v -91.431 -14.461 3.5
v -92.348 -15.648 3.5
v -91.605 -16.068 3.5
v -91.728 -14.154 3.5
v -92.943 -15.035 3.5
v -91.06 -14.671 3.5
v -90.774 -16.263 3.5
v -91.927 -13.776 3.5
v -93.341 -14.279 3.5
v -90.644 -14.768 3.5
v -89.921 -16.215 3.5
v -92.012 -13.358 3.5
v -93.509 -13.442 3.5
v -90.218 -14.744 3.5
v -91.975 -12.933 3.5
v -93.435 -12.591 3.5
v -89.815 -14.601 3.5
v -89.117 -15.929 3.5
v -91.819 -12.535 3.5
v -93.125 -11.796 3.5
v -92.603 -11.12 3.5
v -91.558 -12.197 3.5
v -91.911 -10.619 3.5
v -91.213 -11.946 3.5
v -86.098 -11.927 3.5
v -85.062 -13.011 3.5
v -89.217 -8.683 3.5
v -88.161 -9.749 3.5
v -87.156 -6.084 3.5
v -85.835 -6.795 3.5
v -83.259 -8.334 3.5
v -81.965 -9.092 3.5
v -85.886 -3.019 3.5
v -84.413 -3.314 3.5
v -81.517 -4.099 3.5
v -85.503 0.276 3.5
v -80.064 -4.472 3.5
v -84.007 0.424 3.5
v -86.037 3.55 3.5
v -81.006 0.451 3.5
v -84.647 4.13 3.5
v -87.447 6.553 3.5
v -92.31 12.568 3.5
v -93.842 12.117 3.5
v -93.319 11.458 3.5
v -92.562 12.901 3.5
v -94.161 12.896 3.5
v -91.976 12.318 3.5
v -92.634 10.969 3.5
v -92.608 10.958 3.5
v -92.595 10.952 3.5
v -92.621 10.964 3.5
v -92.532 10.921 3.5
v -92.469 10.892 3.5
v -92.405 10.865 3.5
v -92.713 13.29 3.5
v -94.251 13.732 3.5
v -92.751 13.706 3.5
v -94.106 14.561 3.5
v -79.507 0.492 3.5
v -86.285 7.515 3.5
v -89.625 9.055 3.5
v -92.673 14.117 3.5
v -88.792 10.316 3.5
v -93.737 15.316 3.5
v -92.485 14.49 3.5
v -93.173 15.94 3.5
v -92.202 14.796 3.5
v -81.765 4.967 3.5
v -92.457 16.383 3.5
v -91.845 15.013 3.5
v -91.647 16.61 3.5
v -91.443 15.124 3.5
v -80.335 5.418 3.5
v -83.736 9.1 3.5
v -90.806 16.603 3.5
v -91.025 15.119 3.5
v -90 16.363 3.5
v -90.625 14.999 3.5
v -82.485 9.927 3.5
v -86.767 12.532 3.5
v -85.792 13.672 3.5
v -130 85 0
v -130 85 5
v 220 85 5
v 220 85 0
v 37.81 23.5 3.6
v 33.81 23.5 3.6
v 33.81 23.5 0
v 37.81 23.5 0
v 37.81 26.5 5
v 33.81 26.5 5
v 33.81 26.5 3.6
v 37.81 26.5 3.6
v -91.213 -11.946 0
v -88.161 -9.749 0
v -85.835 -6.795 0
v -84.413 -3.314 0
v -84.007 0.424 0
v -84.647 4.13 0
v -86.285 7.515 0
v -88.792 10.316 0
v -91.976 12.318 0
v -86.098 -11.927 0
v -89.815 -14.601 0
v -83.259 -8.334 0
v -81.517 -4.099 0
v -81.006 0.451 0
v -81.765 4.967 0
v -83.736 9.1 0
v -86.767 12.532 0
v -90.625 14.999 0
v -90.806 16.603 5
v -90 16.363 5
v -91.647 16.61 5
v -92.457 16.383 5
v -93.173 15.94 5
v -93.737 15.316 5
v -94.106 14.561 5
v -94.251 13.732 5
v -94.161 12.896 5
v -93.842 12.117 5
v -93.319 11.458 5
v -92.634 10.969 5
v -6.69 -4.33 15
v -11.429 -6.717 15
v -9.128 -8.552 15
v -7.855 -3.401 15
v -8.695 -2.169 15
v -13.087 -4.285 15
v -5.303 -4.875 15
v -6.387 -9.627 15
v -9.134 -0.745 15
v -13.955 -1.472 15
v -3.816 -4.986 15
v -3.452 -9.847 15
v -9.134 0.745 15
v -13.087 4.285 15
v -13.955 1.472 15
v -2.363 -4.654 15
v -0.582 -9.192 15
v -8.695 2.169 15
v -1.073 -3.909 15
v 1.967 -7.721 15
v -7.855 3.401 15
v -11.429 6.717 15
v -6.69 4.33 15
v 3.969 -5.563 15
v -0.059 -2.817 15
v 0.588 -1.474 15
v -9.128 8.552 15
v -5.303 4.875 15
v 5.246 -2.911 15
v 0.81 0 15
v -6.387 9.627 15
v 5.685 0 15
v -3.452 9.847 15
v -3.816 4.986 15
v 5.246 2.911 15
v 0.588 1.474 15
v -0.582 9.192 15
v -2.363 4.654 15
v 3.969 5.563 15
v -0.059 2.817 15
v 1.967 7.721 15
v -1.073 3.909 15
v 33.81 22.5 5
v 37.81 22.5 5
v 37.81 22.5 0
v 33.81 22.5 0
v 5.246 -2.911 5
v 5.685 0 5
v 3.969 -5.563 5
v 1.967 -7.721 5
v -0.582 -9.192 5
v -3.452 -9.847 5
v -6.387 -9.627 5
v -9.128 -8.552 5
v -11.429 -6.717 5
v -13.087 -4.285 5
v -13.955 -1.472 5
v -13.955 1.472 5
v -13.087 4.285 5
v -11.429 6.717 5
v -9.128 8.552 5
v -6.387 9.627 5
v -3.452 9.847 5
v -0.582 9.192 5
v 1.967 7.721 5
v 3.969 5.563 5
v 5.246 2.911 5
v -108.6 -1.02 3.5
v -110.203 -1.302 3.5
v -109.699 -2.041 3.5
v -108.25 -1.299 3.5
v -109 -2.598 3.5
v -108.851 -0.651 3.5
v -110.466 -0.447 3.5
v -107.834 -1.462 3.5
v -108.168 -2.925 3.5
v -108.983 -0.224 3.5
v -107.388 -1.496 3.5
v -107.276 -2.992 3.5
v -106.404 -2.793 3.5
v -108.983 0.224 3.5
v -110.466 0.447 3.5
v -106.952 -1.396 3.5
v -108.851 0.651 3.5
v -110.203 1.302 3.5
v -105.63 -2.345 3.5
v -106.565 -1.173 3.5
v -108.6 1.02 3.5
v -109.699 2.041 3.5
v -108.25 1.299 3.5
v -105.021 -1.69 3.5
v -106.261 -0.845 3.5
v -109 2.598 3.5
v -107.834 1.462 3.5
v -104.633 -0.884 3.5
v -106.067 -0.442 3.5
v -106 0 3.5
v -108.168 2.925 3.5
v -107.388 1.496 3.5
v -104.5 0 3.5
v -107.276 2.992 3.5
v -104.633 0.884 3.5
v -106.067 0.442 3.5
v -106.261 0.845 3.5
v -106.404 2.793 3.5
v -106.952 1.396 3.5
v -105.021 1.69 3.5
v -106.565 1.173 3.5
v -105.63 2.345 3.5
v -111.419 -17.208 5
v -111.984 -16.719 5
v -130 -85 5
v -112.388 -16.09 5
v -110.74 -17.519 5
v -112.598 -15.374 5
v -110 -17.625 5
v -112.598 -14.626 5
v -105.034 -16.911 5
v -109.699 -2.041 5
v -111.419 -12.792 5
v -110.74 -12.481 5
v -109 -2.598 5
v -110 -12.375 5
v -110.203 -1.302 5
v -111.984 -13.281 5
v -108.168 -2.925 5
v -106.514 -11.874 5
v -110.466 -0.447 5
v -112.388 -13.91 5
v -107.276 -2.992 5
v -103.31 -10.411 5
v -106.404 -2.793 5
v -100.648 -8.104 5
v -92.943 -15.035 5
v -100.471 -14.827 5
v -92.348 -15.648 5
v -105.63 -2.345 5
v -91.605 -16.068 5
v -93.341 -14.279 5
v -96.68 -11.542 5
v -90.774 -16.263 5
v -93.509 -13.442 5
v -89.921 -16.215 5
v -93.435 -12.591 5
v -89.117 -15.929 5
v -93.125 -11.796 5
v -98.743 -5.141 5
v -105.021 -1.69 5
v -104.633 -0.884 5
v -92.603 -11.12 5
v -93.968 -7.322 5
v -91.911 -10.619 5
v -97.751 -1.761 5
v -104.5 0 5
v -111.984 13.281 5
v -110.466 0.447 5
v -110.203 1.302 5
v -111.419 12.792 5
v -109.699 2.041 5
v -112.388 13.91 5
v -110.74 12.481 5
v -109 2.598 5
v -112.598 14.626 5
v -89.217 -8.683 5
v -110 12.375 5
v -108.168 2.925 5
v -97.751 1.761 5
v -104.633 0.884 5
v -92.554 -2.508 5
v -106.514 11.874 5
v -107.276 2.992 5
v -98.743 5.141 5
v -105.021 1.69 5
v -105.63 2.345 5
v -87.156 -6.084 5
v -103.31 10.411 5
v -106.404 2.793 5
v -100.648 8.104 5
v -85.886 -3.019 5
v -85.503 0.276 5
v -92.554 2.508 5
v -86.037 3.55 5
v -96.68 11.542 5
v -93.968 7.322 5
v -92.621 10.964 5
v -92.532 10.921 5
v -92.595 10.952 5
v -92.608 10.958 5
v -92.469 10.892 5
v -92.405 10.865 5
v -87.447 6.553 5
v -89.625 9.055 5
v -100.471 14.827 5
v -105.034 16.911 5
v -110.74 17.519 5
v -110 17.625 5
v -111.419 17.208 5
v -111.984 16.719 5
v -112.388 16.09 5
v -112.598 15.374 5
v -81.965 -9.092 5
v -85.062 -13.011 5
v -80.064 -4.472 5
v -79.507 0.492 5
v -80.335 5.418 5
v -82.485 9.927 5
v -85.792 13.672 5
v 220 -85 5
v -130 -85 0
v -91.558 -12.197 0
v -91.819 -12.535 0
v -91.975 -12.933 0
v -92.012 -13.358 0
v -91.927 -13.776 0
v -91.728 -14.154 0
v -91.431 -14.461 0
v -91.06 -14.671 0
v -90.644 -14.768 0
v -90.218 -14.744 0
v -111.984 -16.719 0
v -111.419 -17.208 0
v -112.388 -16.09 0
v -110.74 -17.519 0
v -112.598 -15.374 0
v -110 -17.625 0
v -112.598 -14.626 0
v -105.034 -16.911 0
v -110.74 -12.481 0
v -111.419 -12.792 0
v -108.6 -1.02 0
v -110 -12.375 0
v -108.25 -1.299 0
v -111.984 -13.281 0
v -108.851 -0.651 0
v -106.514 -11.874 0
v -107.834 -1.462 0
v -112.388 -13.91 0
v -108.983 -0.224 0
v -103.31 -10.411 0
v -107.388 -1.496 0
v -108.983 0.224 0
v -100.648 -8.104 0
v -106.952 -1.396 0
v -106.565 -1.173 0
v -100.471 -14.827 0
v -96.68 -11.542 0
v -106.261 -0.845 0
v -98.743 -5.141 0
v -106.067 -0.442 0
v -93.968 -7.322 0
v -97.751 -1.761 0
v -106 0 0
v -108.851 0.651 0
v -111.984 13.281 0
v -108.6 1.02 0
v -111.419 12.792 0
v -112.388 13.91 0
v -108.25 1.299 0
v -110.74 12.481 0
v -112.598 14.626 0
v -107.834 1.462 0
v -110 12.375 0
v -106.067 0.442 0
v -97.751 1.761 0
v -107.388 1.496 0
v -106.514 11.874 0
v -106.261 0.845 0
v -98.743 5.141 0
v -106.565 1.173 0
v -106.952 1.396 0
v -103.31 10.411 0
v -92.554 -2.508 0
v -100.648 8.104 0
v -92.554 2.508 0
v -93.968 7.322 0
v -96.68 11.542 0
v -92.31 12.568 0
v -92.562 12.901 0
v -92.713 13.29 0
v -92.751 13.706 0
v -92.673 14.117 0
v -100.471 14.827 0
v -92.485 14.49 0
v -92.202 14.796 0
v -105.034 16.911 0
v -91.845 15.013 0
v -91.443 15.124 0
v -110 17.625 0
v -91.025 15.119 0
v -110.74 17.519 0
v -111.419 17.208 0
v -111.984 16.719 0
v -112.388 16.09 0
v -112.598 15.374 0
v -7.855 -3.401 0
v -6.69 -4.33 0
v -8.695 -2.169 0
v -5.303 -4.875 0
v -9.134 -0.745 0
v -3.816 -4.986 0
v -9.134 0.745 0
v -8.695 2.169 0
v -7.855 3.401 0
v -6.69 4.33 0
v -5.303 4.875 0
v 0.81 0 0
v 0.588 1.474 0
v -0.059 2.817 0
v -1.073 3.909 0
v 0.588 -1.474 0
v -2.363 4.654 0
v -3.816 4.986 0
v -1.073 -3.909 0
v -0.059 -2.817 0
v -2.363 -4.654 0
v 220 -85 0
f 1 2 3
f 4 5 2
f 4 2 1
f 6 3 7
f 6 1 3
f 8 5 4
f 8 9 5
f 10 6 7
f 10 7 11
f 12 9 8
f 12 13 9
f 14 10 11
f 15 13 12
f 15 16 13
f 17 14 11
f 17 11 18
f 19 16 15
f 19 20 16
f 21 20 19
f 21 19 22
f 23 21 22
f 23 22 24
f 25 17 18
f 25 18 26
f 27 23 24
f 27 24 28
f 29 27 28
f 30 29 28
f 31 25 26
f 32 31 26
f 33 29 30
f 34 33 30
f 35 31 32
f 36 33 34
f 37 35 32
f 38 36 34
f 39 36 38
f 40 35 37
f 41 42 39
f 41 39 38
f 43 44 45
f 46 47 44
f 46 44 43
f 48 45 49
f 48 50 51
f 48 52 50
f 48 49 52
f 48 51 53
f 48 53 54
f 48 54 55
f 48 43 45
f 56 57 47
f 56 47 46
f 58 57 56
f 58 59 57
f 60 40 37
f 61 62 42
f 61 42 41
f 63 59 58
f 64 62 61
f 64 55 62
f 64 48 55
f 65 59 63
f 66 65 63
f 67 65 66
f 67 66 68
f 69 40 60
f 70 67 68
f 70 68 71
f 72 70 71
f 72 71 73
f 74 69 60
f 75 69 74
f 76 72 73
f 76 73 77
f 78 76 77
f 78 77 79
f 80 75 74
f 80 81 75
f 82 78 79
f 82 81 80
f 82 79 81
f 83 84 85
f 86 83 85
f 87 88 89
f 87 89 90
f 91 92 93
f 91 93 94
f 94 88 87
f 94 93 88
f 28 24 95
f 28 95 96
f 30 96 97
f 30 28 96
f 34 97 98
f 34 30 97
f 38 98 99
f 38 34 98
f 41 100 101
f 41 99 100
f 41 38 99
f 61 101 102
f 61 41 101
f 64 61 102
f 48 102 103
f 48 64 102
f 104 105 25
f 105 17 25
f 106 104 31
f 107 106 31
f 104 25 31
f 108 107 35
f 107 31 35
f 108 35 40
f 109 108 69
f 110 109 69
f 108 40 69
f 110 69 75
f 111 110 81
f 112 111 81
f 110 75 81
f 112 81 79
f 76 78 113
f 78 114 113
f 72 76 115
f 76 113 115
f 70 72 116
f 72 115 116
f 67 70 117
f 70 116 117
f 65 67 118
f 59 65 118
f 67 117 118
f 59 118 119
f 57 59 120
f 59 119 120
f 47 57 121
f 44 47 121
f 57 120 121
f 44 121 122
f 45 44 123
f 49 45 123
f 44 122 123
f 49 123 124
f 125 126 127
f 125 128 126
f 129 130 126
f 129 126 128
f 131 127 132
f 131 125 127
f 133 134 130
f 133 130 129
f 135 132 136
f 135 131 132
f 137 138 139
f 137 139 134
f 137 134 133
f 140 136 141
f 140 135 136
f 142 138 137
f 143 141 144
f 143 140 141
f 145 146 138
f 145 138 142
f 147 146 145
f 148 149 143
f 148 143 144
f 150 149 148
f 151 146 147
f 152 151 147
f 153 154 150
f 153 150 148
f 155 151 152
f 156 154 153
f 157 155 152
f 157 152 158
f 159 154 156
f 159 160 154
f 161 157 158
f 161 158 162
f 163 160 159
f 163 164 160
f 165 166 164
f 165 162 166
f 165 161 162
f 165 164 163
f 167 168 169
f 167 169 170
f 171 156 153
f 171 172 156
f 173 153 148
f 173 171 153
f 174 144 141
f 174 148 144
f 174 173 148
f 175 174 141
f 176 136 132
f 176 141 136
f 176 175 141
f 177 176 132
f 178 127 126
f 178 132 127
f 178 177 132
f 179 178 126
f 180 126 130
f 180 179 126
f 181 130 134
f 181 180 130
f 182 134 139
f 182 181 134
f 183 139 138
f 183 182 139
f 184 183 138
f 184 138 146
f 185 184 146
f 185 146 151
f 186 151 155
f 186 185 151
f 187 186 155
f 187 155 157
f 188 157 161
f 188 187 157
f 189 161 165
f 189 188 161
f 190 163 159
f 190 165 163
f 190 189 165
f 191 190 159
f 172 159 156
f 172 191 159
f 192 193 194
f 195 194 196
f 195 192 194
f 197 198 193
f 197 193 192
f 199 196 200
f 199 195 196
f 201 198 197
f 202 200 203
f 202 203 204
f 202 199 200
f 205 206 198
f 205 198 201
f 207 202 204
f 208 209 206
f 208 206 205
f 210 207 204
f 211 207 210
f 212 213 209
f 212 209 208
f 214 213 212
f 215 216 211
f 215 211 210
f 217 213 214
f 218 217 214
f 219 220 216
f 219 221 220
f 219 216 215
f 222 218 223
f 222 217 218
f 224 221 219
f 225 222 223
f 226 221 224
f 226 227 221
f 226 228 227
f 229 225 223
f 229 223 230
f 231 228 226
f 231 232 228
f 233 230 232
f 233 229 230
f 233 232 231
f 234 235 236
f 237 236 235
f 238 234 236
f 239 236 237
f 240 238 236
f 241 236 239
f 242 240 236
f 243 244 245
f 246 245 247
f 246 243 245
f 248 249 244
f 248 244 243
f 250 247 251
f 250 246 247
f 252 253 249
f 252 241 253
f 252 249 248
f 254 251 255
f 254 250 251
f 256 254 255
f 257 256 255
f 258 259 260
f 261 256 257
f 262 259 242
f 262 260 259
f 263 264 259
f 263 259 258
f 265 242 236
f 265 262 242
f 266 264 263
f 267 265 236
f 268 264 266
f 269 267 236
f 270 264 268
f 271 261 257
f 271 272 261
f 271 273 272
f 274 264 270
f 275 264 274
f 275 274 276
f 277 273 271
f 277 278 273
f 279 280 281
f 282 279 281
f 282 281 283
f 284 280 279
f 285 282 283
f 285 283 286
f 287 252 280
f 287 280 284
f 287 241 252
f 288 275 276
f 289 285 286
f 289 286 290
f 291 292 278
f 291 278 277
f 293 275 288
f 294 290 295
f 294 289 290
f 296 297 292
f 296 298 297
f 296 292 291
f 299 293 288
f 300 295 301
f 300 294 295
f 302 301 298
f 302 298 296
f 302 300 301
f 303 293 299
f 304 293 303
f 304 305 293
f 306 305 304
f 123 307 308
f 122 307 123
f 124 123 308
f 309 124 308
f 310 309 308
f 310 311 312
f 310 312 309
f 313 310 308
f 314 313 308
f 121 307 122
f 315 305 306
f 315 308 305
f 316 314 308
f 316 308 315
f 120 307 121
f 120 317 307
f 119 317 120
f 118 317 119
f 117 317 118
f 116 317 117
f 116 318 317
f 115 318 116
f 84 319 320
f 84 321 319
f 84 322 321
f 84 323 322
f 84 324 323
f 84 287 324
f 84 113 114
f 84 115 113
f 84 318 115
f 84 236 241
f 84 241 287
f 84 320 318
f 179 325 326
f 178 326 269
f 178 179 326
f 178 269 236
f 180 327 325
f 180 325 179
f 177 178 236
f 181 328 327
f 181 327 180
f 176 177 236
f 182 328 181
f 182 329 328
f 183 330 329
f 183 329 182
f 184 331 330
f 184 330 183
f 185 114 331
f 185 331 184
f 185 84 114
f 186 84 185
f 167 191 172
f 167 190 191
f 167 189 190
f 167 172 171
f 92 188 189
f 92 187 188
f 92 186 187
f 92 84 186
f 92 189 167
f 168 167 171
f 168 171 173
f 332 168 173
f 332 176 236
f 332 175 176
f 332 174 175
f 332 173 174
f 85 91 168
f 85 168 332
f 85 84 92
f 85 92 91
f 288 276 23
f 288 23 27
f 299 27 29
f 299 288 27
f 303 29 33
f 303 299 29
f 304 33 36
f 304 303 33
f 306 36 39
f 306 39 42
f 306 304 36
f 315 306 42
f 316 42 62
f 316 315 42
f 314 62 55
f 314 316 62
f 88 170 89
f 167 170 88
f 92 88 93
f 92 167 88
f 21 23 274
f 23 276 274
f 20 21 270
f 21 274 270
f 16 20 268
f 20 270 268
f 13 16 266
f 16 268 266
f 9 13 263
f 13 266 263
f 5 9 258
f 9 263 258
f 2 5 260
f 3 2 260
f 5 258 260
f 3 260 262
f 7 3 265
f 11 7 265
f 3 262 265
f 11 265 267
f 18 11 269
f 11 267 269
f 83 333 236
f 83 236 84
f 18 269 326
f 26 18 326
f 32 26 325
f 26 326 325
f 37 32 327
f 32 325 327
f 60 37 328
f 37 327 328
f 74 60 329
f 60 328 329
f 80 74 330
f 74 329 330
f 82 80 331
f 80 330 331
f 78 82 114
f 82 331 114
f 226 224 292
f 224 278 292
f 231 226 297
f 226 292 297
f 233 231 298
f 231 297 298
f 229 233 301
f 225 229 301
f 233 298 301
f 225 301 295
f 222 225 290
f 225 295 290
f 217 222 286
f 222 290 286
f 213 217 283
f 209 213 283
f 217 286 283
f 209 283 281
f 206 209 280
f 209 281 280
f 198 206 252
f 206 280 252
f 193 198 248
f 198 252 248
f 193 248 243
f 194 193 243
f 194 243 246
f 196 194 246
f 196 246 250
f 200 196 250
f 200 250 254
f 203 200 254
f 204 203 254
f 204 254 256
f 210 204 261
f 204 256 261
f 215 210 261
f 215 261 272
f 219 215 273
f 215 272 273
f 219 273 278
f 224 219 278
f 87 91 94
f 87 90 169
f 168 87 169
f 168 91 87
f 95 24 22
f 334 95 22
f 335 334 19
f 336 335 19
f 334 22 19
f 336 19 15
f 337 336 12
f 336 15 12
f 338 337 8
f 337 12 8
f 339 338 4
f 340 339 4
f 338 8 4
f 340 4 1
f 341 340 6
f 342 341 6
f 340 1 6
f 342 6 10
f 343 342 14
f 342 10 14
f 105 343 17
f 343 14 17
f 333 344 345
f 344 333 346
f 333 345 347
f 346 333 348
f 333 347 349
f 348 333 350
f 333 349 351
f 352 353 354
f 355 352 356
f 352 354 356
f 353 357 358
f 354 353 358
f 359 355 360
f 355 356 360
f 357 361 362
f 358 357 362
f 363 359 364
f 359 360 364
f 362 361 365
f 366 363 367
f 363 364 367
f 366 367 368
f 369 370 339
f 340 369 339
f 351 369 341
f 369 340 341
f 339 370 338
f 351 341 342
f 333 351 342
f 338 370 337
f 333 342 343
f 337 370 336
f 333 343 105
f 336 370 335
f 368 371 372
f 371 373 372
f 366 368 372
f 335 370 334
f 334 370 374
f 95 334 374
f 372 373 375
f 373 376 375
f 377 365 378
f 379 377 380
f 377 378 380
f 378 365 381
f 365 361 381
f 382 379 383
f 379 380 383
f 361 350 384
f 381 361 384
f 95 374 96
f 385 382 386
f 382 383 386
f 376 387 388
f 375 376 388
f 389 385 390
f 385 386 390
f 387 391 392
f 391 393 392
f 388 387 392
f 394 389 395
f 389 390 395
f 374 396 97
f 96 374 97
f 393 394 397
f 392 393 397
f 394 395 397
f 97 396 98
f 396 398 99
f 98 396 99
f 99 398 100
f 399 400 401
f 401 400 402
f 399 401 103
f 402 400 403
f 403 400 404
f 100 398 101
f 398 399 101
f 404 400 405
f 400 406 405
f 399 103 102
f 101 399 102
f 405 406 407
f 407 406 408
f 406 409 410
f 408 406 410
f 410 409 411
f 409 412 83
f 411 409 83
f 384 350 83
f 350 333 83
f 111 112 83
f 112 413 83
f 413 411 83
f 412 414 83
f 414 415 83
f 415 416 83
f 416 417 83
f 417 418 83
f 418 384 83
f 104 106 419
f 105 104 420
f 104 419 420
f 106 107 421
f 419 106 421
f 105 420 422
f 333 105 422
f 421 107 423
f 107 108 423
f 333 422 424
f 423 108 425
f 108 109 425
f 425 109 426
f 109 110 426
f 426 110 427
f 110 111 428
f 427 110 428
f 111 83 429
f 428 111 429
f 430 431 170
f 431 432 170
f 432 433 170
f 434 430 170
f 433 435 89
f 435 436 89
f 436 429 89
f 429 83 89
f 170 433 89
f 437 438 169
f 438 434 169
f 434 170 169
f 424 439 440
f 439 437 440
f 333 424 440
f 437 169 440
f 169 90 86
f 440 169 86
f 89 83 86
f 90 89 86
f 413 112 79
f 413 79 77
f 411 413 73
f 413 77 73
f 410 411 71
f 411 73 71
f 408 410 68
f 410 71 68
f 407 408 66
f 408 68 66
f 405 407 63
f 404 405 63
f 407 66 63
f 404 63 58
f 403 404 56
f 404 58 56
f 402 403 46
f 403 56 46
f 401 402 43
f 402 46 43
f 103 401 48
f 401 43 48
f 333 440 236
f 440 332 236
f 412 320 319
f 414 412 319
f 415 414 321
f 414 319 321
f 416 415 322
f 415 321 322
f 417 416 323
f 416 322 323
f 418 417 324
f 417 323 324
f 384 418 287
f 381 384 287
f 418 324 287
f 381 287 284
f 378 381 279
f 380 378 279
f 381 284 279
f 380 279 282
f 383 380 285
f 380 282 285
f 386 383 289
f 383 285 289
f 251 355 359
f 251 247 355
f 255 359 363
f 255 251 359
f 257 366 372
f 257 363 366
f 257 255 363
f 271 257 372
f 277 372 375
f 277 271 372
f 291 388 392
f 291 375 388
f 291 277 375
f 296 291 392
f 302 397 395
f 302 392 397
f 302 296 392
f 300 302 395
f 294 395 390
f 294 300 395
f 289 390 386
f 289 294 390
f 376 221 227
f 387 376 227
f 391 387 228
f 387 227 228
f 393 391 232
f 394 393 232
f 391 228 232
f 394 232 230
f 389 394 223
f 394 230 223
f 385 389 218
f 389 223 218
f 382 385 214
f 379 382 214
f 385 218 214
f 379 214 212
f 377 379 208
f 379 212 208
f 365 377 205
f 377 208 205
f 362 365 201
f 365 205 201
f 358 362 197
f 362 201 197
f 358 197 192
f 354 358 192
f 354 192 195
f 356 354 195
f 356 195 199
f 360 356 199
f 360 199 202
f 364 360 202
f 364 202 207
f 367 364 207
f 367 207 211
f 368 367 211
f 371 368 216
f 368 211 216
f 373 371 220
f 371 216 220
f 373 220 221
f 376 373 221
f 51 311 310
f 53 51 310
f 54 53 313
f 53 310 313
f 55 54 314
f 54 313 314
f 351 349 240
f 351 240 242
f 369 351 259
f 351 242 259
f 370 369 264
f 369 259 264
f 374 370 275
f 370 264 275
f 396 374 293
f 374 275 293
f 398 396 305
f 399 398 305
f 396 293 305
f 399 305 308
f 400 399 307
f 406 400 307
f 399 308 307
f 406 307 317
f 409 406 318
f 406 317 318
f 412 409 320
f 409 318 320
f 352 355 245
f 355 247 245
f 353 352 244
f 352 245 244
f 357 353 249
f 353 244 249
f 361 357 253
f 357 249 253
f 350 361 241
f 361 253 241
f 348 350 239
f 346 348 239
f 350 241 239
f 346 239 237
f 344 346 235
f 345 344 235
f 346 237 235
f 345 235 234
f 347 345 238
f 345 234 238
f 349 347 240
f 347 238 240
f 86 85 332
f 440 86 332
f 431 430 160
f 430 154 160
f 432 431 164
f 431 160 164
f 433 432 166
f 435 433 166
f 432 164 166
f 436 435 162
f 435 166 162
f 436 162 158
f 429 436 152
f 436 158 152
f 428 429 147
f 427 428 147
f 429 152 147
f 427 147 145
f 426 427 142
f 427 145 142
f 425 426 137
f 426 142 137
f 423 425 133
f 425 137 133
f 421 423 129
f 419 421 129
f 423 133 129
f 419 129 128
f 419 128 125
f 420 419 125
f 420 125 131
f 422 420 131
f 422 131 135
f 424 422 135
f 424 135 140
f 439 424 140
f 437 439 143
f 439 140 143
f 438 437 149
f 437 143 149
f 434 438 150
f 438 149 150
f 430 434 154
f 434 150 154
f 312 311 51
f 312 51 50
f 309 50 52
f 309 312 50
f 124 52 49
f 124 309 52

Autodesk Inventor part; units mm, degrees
ref_plane "YZ Plane" through (0, 0, 0) normal (1, 0, 0) x (0, 1, 0)
ref_plane "XZ Plane" through (0, 0, 0) normal (0, 1, 0) x (-1, 0, 0)
sketch "Boceto2" plane through (0, 0, 0) normal (0, 0, 1) x (1, 0, 0)
  line L0 (130, -85) -> (-130, -85)
  line L1 (-130, -85) -> (-130, 85)
  line L2 (-130, 85) -> (130, 85)
  line L3 (130, 85) -> (130, -85)
  line L4 (130, -85) -> (-130, 85) construction
  line L5 (-130, -85) -> (130, 85) construction
  point P0 (0, 0)
  dimension "d0" = 260
  dimension "d1" = 170
extrude "Extrusión1" add sketch "Boceto2" along normal blind 5
sketch "Boceto3" plane through (0, 0, 5) normal (0, 0, 1) x (1, 0, 0)
  line L0 (-95, 0) -> (-4.19, 0) construction
  circle A0 centre (-95, 0) radius 2.625
  circle A1 centre (-4.19, 0) radius 9.875
  line L1 (-130, 85) -> (-130, -85) projected
  line L2 (130, -85) -> (130, 85) projected
  line L3 (-130, -85) -> (130, -85) projected
  line L4 (130, 0) -> (80, 0) construction
  line L5 (80, 0) -> (80, -23.2237) construction
  arc A2 (-110, -17.625) -> (-110, 17.625) centre (-110, 0) ccw
  arc A3 (-110, -12.375) -> (-110, 12.375) centre (-110, 0) ccw
  arc A4 (-110, 17.625) -> (-110, 12.375) centre (-110, 15) ccw
  arc A5 (-110, -12.375) -> (-110, -17.625) centre (-110, -15) ccw
  point P0 (0, 0)
  point P1 (-130, 0)
  point P2 (-92.375, 0)
  point P3 (-97.625, 0)
  dimension "d7" = 5.25
  dimension "d8" = 19.75
  dimension "d14" = 85
  dimension "d29" = 50
  dimension "d31" = 35
  dimension "d32" = 134.19
sketch "Boceto5" plane through (0, 0, 0) normal (0, 0, -1) x (-1, 0, 0)
  line L0 (-130, -85) -> (-130, 85) projected
  line L1 (130, -85) -> (-130, -85)
  line L2 (-130, -85) -> (-130, 85)
  line L3 (-130, 85) -> (130, 85)
  line L4 (130, 85) -> (130, -85)
  line L5 (130, -85) -> (-130, 85) construction
  line L6 (-130, -85) -> (130, 85) construction
  line L7 (119.5, 74.5) -> (-119.5, 74.5)
  line L8 (-119.5, 74.5) -> (-119.5, -74.5)
  line L9 (-119.5, -74.5) -> (119.5, -74.5)
  line L10 (119.5, -74.5) -> (119.5, 74.5)
  circle A0 centre (95, 0) radius 2.625 projected
  circle A1 centre (95, 0) radius 2.625
  point P0 (0, 0)
  dimension "d23" = 10.5
  dimension "d25" = 5.25
extrude "Extrusión4" [suppressed]
sketch "Boceto6" plane through (0, 0, 5) normal (0, 0, 1) x (1, 0, 0)
  circle A0 centre (-4.19, 0) radius 10.125 projected
  line L0 (-4.19, 0) -> (35.81, 0)
  line L1 (35.81, 0) -> (35.81, 25)
  line L2 (37.81, 23.5) -> (33.81, 23.5)
  line L3 (33.81, 23.5) -> (33.81, 26.5)
  line L4 (33.81, 26.5) -> (37.81, 26.5)
  line L5 (37.81, 26.5) -> (37.81, 23.5)
  line L6 (37.81, 23.5) -> (33.81, 26.5) construction
  line L7 (33.81, 23.5) -> (37.81, 26.5) construction
  point P0 (0, 0)
  dimension "d35" = 40
  dimension "d36" = 25
  dimension "d38" = 4
  dimension "d39" = 3
extrude "Extrusión5" cut sketch "Boceto6" against normal blind 1.4 contours L2 L3 L4 L5
sketch "Boceto8" plane through (0, 0, 5) normal (0, 0, 1) x (1, 0, 0)
  line L0 (33.81, 23.5) -> (33.81, 26.5) projected
  line L1 (33.81, 23.5) -> (37.81, 23.5)
  line L2 (37.81, 23.5) -> (37.81, 22.5)
  line L3 (37.81, 22.5) -> (33.81, 22.5)
  line L4 (33.81, 22.5) -> (33.81, 23.5)
  point P0 (0, 0)
  dimension "d42" = 4
  dimension "d43" = 1
extrude "Extrusión6" cut sketch "Boceto8" against normal through all
sketch "Boceto10" plane through (0, 0, -4) normal (0, 0, -1) x (-1, 0, 0)
  circle A0 centre (95, 0) radius 2.625 projected
  circle A1 centre (95, 0) radius 7.5
  point P0 (0, 0)
  dimension "d51" = 15
ref_plane "Plano de trabajo1" through (-95, 0, 0) normal (0, 0, -1) x (-1, 0, 0)
sketch "Boceto12" plane through (0, 0, 5) normal (0, 0, 1) x (1, 0, 0)
  circle A0 centre (-95, 0) radius 2.625 construction
  circle A1 centre (-95, 0) radius 18.5 construction
  circle A2 centre (-95, 0) radius 20 construction
  circle A3 centre (-95, 0) radius 7.5 construction
  line L0 (-95, 0) -> (-82.5, 0) construction
  circle A4 centre (-82.5, 0) radius 3
  line L1 (-95, 0) -> (-107.5, 0) construction
  circle A5 centre (-107.5, 0) radius 3
  circle A6 centre (-107.5, 0) radius 1.5 construction
  circle A7 centre (-82.5, 0) radius 1.5 construction
  line L2 (-82.5, 0) -> (-97.5, 0) construction
  line L3 (-97.5, 0) -> (-97.5, 18.5) construction
  arc A8 (-89.1168, -15.9286) -> (-89.9998, 16.363) centre (-97.5, 0) ccw
  arc A9 (-91.9112, -10.6191) -> (-92.6345, 10.9694) centre (-97.5, 0) ccw
  arc A10 (-91.9112, -10.6191) -> (-89.1168, -15.9286) centre (-90.514, -13.2739) ccw
  arc A11 (-89.9998, 16.363) -> (-92.6345, 10.9694) centre (-91.2508, 13.6338) ccw
  arc A12 (-91.9112, -10.6191) -> (-89.1168, -15.9286) centre (-90.514, -13.2739) ccw
  arc A13 (-92.595, 10.9517) -> (-92.4052, 10.8647) centre (-91.2508, 13.6338) ccw
  arc A14 (-91.9112, -10.6191) -> (-89.1168, -15.9286) centre (-90.514, -13.2739) ccw
  arc A15 (-89.8154, -14.6013) -> (-90.6248, 14.9994) centre (-97.5, 0) ccw
  arc A16 (-90.6248, 14.9994) -> (-91.9757, 12.318) centre (-91.2508, 13.6338) ccw
  arc A17 (-91.2126, -11.9465) -> (-91.9757, 12.318) centre (-97.5, 0) ccw
  arc A18 (-91.2126, -11.9465) -> (-89.8154, -14.6013) centre (-90.514, -13.2739) ccw
  circle A19 centre (-82.5, 0) radius 1.5
  line L4 (-130, 85) -> (-130, -85) projected
  line L5 (-130, -85) -> (130, -85) projected
  point P0 (0, 0)
  point P1 (-89.8154, -14.6013)
  point P2 (-91.2126, -11.9465)
  point P3 (-84.225, -2.4545)
  point P4 (-85.5, 0)
  point P5 (-79.5, 0)
  point P6 (-81.225, -2.7156)
  point P7 (-84.225, 2.4545)
  point P8 (-81.225, 2.7156)
  point P9 (-84, 0)
  point P10 (-81, 0)
  dimension "d57" = 37
  dimension "d58" = 40
  dimension "d59" = 15
  dimension "d60" = 12.5
  dimension "d61" = 6
  dimension "d62" = 12.5
  dimension "d63" = 6
  dimension "d64" = 3
  dimension "d65" = 3
  dimension "d126" = 15
  dimension "d127" = 6
  dimension "d128" = 6
  dimension "d129" = 1.5
  dimension "d130" = 1.5
  dimension "d135" = 3
  dimension "d137" = 38.7492
  dimension "d138" = 98.6338
extrude "Extrusión10" cut sketch "Boceto12" against normal blind 1.5 contours A4 A15 | A15 A19 A17 A4 | A4 A17 A19 A15 | A17 A4 | A19 | A5
sketch "Boceto13" plane through (-82.5, 0, 3.5) normal (0, 0, 1) x (1, 0, 0)
  circle A0 centre (0, 0) radius 1.5
  circle A1 centre (-25, 0) radius 3 projected
  circle A2 centre (-25, 0) radius 1.5
  point P0 (82.5, 0)
  dimension "d68" = 3
  dimension "d69" = 3
extrude "Extrusión11" cut sketch "Boceto13" against normal through all contours A0 | A2
extrude "Extrusión12" [suppressed]
extrude "Extrusión13" add sketch "Boceto3" along normal blind 10 contours A1
sketch "Boceto15" plane through (-4.19, 0, 15) normal (0, 0, 1) x (1, 0, 0)
  circle A0 centre (0, 0) radius 5
  circle A1 centre (0, 0) radius 74 construction
  circle A2 centre (-90.81, 0) radius 2.625 construction
  circle A3 centre (-90.81, 0) radius 20 construction
  point P0 (4.19, 0)
  dimension "d77" = 10
  dimension "d80" = 148
  dimension "d82" = 40
extrude "Extrusión14" cut sketch "Boceto15" against normal through all
sketch "Boceto16" plane through (0, 0, -4) normal (0, 0, -1) x (-1, 0, 0)
  line L0 (119.5, 74.5) -> (-119.5, 74.5) projected
  line L1 (-119.5, 74.5) -> (119.5, 74.5)
  line L2 (119.5, 74.5) -> (119.5, -74.5)
  line L3 (119.5, -74.5) -> (-119.5, -74.5)
  line L4 (-119.5, -74.5) -> (-119.5, 74.5)
  line L5 (-114.5, 69.5) -> (114.5, 69.5)
  line L6 (114.5, 69.5) -> (114.5, -69.5)
  line L7 (114.5, -69.5) -> (-114.5, -69.5)
  line L8 (-114.5, -69.5) -> (-114.5, 69.5)
  point P0 (0, 0)
  dimension "d83" = 5
extrude "Extrusión15" [suppressed]
sketch "Boceto17" plane through (0, 0, 5) normal (0, 0, 1) x (1, 0, 0)
  circle A0 centre (-95, 0) radius 2.625 construction
  circle A1 centre (-4.19, 0) radius 5 construction
  circle A2 centre (-4.19, 0) radius 40
  circle A3 centre (-4.19, 0) radius 15
  point P0 (0, 0)
  dimension "d87" = 80
  dimension "d88" = 30
sketch "Boceto20" plane through (0, 0, 5) normal (0, 0, 1) x (1, 0, 0)
  line L0 (130, 85) -> (-130, 85) projected
  line L1 (130, -85) -> (130, 85)
  line L2 (130, 85) -> (220, 85)
  line L3 (220, 85) -> (220, -85)
  line L4 (220, -85) -> (130, -85)
  line L5 (130, -85) -> (130, 85)
  point P0 (0, 0)
  dimension "d115" = 90
extrude "Extrusión22" add sketch "Boceto20" against normal blind 5
extrude "Extrusión23" cut sketch "Boceto3" against normal through all contours A0
extrude "Extrusión24" cut sketch "Boceto3" against normal blind 5 contours A2 A5 A3 A0 | A0 A3 A4 A2
extrude "Extrusión25" cut sketch "Boceto12" against normal blind 1.5 contours A8 A10 A9 A4 A17 A18 A15 | A4 A15 A16 A17 A9 A11 A8
extrude "Extrusión26" cut sketch "Boceto12" against normal through all contours A15 A19 A17 A4 | A4 A17 A16 A15 | A15 A18 A17 A4 | A4 A17 A19 A15
properties part number "Lid"
